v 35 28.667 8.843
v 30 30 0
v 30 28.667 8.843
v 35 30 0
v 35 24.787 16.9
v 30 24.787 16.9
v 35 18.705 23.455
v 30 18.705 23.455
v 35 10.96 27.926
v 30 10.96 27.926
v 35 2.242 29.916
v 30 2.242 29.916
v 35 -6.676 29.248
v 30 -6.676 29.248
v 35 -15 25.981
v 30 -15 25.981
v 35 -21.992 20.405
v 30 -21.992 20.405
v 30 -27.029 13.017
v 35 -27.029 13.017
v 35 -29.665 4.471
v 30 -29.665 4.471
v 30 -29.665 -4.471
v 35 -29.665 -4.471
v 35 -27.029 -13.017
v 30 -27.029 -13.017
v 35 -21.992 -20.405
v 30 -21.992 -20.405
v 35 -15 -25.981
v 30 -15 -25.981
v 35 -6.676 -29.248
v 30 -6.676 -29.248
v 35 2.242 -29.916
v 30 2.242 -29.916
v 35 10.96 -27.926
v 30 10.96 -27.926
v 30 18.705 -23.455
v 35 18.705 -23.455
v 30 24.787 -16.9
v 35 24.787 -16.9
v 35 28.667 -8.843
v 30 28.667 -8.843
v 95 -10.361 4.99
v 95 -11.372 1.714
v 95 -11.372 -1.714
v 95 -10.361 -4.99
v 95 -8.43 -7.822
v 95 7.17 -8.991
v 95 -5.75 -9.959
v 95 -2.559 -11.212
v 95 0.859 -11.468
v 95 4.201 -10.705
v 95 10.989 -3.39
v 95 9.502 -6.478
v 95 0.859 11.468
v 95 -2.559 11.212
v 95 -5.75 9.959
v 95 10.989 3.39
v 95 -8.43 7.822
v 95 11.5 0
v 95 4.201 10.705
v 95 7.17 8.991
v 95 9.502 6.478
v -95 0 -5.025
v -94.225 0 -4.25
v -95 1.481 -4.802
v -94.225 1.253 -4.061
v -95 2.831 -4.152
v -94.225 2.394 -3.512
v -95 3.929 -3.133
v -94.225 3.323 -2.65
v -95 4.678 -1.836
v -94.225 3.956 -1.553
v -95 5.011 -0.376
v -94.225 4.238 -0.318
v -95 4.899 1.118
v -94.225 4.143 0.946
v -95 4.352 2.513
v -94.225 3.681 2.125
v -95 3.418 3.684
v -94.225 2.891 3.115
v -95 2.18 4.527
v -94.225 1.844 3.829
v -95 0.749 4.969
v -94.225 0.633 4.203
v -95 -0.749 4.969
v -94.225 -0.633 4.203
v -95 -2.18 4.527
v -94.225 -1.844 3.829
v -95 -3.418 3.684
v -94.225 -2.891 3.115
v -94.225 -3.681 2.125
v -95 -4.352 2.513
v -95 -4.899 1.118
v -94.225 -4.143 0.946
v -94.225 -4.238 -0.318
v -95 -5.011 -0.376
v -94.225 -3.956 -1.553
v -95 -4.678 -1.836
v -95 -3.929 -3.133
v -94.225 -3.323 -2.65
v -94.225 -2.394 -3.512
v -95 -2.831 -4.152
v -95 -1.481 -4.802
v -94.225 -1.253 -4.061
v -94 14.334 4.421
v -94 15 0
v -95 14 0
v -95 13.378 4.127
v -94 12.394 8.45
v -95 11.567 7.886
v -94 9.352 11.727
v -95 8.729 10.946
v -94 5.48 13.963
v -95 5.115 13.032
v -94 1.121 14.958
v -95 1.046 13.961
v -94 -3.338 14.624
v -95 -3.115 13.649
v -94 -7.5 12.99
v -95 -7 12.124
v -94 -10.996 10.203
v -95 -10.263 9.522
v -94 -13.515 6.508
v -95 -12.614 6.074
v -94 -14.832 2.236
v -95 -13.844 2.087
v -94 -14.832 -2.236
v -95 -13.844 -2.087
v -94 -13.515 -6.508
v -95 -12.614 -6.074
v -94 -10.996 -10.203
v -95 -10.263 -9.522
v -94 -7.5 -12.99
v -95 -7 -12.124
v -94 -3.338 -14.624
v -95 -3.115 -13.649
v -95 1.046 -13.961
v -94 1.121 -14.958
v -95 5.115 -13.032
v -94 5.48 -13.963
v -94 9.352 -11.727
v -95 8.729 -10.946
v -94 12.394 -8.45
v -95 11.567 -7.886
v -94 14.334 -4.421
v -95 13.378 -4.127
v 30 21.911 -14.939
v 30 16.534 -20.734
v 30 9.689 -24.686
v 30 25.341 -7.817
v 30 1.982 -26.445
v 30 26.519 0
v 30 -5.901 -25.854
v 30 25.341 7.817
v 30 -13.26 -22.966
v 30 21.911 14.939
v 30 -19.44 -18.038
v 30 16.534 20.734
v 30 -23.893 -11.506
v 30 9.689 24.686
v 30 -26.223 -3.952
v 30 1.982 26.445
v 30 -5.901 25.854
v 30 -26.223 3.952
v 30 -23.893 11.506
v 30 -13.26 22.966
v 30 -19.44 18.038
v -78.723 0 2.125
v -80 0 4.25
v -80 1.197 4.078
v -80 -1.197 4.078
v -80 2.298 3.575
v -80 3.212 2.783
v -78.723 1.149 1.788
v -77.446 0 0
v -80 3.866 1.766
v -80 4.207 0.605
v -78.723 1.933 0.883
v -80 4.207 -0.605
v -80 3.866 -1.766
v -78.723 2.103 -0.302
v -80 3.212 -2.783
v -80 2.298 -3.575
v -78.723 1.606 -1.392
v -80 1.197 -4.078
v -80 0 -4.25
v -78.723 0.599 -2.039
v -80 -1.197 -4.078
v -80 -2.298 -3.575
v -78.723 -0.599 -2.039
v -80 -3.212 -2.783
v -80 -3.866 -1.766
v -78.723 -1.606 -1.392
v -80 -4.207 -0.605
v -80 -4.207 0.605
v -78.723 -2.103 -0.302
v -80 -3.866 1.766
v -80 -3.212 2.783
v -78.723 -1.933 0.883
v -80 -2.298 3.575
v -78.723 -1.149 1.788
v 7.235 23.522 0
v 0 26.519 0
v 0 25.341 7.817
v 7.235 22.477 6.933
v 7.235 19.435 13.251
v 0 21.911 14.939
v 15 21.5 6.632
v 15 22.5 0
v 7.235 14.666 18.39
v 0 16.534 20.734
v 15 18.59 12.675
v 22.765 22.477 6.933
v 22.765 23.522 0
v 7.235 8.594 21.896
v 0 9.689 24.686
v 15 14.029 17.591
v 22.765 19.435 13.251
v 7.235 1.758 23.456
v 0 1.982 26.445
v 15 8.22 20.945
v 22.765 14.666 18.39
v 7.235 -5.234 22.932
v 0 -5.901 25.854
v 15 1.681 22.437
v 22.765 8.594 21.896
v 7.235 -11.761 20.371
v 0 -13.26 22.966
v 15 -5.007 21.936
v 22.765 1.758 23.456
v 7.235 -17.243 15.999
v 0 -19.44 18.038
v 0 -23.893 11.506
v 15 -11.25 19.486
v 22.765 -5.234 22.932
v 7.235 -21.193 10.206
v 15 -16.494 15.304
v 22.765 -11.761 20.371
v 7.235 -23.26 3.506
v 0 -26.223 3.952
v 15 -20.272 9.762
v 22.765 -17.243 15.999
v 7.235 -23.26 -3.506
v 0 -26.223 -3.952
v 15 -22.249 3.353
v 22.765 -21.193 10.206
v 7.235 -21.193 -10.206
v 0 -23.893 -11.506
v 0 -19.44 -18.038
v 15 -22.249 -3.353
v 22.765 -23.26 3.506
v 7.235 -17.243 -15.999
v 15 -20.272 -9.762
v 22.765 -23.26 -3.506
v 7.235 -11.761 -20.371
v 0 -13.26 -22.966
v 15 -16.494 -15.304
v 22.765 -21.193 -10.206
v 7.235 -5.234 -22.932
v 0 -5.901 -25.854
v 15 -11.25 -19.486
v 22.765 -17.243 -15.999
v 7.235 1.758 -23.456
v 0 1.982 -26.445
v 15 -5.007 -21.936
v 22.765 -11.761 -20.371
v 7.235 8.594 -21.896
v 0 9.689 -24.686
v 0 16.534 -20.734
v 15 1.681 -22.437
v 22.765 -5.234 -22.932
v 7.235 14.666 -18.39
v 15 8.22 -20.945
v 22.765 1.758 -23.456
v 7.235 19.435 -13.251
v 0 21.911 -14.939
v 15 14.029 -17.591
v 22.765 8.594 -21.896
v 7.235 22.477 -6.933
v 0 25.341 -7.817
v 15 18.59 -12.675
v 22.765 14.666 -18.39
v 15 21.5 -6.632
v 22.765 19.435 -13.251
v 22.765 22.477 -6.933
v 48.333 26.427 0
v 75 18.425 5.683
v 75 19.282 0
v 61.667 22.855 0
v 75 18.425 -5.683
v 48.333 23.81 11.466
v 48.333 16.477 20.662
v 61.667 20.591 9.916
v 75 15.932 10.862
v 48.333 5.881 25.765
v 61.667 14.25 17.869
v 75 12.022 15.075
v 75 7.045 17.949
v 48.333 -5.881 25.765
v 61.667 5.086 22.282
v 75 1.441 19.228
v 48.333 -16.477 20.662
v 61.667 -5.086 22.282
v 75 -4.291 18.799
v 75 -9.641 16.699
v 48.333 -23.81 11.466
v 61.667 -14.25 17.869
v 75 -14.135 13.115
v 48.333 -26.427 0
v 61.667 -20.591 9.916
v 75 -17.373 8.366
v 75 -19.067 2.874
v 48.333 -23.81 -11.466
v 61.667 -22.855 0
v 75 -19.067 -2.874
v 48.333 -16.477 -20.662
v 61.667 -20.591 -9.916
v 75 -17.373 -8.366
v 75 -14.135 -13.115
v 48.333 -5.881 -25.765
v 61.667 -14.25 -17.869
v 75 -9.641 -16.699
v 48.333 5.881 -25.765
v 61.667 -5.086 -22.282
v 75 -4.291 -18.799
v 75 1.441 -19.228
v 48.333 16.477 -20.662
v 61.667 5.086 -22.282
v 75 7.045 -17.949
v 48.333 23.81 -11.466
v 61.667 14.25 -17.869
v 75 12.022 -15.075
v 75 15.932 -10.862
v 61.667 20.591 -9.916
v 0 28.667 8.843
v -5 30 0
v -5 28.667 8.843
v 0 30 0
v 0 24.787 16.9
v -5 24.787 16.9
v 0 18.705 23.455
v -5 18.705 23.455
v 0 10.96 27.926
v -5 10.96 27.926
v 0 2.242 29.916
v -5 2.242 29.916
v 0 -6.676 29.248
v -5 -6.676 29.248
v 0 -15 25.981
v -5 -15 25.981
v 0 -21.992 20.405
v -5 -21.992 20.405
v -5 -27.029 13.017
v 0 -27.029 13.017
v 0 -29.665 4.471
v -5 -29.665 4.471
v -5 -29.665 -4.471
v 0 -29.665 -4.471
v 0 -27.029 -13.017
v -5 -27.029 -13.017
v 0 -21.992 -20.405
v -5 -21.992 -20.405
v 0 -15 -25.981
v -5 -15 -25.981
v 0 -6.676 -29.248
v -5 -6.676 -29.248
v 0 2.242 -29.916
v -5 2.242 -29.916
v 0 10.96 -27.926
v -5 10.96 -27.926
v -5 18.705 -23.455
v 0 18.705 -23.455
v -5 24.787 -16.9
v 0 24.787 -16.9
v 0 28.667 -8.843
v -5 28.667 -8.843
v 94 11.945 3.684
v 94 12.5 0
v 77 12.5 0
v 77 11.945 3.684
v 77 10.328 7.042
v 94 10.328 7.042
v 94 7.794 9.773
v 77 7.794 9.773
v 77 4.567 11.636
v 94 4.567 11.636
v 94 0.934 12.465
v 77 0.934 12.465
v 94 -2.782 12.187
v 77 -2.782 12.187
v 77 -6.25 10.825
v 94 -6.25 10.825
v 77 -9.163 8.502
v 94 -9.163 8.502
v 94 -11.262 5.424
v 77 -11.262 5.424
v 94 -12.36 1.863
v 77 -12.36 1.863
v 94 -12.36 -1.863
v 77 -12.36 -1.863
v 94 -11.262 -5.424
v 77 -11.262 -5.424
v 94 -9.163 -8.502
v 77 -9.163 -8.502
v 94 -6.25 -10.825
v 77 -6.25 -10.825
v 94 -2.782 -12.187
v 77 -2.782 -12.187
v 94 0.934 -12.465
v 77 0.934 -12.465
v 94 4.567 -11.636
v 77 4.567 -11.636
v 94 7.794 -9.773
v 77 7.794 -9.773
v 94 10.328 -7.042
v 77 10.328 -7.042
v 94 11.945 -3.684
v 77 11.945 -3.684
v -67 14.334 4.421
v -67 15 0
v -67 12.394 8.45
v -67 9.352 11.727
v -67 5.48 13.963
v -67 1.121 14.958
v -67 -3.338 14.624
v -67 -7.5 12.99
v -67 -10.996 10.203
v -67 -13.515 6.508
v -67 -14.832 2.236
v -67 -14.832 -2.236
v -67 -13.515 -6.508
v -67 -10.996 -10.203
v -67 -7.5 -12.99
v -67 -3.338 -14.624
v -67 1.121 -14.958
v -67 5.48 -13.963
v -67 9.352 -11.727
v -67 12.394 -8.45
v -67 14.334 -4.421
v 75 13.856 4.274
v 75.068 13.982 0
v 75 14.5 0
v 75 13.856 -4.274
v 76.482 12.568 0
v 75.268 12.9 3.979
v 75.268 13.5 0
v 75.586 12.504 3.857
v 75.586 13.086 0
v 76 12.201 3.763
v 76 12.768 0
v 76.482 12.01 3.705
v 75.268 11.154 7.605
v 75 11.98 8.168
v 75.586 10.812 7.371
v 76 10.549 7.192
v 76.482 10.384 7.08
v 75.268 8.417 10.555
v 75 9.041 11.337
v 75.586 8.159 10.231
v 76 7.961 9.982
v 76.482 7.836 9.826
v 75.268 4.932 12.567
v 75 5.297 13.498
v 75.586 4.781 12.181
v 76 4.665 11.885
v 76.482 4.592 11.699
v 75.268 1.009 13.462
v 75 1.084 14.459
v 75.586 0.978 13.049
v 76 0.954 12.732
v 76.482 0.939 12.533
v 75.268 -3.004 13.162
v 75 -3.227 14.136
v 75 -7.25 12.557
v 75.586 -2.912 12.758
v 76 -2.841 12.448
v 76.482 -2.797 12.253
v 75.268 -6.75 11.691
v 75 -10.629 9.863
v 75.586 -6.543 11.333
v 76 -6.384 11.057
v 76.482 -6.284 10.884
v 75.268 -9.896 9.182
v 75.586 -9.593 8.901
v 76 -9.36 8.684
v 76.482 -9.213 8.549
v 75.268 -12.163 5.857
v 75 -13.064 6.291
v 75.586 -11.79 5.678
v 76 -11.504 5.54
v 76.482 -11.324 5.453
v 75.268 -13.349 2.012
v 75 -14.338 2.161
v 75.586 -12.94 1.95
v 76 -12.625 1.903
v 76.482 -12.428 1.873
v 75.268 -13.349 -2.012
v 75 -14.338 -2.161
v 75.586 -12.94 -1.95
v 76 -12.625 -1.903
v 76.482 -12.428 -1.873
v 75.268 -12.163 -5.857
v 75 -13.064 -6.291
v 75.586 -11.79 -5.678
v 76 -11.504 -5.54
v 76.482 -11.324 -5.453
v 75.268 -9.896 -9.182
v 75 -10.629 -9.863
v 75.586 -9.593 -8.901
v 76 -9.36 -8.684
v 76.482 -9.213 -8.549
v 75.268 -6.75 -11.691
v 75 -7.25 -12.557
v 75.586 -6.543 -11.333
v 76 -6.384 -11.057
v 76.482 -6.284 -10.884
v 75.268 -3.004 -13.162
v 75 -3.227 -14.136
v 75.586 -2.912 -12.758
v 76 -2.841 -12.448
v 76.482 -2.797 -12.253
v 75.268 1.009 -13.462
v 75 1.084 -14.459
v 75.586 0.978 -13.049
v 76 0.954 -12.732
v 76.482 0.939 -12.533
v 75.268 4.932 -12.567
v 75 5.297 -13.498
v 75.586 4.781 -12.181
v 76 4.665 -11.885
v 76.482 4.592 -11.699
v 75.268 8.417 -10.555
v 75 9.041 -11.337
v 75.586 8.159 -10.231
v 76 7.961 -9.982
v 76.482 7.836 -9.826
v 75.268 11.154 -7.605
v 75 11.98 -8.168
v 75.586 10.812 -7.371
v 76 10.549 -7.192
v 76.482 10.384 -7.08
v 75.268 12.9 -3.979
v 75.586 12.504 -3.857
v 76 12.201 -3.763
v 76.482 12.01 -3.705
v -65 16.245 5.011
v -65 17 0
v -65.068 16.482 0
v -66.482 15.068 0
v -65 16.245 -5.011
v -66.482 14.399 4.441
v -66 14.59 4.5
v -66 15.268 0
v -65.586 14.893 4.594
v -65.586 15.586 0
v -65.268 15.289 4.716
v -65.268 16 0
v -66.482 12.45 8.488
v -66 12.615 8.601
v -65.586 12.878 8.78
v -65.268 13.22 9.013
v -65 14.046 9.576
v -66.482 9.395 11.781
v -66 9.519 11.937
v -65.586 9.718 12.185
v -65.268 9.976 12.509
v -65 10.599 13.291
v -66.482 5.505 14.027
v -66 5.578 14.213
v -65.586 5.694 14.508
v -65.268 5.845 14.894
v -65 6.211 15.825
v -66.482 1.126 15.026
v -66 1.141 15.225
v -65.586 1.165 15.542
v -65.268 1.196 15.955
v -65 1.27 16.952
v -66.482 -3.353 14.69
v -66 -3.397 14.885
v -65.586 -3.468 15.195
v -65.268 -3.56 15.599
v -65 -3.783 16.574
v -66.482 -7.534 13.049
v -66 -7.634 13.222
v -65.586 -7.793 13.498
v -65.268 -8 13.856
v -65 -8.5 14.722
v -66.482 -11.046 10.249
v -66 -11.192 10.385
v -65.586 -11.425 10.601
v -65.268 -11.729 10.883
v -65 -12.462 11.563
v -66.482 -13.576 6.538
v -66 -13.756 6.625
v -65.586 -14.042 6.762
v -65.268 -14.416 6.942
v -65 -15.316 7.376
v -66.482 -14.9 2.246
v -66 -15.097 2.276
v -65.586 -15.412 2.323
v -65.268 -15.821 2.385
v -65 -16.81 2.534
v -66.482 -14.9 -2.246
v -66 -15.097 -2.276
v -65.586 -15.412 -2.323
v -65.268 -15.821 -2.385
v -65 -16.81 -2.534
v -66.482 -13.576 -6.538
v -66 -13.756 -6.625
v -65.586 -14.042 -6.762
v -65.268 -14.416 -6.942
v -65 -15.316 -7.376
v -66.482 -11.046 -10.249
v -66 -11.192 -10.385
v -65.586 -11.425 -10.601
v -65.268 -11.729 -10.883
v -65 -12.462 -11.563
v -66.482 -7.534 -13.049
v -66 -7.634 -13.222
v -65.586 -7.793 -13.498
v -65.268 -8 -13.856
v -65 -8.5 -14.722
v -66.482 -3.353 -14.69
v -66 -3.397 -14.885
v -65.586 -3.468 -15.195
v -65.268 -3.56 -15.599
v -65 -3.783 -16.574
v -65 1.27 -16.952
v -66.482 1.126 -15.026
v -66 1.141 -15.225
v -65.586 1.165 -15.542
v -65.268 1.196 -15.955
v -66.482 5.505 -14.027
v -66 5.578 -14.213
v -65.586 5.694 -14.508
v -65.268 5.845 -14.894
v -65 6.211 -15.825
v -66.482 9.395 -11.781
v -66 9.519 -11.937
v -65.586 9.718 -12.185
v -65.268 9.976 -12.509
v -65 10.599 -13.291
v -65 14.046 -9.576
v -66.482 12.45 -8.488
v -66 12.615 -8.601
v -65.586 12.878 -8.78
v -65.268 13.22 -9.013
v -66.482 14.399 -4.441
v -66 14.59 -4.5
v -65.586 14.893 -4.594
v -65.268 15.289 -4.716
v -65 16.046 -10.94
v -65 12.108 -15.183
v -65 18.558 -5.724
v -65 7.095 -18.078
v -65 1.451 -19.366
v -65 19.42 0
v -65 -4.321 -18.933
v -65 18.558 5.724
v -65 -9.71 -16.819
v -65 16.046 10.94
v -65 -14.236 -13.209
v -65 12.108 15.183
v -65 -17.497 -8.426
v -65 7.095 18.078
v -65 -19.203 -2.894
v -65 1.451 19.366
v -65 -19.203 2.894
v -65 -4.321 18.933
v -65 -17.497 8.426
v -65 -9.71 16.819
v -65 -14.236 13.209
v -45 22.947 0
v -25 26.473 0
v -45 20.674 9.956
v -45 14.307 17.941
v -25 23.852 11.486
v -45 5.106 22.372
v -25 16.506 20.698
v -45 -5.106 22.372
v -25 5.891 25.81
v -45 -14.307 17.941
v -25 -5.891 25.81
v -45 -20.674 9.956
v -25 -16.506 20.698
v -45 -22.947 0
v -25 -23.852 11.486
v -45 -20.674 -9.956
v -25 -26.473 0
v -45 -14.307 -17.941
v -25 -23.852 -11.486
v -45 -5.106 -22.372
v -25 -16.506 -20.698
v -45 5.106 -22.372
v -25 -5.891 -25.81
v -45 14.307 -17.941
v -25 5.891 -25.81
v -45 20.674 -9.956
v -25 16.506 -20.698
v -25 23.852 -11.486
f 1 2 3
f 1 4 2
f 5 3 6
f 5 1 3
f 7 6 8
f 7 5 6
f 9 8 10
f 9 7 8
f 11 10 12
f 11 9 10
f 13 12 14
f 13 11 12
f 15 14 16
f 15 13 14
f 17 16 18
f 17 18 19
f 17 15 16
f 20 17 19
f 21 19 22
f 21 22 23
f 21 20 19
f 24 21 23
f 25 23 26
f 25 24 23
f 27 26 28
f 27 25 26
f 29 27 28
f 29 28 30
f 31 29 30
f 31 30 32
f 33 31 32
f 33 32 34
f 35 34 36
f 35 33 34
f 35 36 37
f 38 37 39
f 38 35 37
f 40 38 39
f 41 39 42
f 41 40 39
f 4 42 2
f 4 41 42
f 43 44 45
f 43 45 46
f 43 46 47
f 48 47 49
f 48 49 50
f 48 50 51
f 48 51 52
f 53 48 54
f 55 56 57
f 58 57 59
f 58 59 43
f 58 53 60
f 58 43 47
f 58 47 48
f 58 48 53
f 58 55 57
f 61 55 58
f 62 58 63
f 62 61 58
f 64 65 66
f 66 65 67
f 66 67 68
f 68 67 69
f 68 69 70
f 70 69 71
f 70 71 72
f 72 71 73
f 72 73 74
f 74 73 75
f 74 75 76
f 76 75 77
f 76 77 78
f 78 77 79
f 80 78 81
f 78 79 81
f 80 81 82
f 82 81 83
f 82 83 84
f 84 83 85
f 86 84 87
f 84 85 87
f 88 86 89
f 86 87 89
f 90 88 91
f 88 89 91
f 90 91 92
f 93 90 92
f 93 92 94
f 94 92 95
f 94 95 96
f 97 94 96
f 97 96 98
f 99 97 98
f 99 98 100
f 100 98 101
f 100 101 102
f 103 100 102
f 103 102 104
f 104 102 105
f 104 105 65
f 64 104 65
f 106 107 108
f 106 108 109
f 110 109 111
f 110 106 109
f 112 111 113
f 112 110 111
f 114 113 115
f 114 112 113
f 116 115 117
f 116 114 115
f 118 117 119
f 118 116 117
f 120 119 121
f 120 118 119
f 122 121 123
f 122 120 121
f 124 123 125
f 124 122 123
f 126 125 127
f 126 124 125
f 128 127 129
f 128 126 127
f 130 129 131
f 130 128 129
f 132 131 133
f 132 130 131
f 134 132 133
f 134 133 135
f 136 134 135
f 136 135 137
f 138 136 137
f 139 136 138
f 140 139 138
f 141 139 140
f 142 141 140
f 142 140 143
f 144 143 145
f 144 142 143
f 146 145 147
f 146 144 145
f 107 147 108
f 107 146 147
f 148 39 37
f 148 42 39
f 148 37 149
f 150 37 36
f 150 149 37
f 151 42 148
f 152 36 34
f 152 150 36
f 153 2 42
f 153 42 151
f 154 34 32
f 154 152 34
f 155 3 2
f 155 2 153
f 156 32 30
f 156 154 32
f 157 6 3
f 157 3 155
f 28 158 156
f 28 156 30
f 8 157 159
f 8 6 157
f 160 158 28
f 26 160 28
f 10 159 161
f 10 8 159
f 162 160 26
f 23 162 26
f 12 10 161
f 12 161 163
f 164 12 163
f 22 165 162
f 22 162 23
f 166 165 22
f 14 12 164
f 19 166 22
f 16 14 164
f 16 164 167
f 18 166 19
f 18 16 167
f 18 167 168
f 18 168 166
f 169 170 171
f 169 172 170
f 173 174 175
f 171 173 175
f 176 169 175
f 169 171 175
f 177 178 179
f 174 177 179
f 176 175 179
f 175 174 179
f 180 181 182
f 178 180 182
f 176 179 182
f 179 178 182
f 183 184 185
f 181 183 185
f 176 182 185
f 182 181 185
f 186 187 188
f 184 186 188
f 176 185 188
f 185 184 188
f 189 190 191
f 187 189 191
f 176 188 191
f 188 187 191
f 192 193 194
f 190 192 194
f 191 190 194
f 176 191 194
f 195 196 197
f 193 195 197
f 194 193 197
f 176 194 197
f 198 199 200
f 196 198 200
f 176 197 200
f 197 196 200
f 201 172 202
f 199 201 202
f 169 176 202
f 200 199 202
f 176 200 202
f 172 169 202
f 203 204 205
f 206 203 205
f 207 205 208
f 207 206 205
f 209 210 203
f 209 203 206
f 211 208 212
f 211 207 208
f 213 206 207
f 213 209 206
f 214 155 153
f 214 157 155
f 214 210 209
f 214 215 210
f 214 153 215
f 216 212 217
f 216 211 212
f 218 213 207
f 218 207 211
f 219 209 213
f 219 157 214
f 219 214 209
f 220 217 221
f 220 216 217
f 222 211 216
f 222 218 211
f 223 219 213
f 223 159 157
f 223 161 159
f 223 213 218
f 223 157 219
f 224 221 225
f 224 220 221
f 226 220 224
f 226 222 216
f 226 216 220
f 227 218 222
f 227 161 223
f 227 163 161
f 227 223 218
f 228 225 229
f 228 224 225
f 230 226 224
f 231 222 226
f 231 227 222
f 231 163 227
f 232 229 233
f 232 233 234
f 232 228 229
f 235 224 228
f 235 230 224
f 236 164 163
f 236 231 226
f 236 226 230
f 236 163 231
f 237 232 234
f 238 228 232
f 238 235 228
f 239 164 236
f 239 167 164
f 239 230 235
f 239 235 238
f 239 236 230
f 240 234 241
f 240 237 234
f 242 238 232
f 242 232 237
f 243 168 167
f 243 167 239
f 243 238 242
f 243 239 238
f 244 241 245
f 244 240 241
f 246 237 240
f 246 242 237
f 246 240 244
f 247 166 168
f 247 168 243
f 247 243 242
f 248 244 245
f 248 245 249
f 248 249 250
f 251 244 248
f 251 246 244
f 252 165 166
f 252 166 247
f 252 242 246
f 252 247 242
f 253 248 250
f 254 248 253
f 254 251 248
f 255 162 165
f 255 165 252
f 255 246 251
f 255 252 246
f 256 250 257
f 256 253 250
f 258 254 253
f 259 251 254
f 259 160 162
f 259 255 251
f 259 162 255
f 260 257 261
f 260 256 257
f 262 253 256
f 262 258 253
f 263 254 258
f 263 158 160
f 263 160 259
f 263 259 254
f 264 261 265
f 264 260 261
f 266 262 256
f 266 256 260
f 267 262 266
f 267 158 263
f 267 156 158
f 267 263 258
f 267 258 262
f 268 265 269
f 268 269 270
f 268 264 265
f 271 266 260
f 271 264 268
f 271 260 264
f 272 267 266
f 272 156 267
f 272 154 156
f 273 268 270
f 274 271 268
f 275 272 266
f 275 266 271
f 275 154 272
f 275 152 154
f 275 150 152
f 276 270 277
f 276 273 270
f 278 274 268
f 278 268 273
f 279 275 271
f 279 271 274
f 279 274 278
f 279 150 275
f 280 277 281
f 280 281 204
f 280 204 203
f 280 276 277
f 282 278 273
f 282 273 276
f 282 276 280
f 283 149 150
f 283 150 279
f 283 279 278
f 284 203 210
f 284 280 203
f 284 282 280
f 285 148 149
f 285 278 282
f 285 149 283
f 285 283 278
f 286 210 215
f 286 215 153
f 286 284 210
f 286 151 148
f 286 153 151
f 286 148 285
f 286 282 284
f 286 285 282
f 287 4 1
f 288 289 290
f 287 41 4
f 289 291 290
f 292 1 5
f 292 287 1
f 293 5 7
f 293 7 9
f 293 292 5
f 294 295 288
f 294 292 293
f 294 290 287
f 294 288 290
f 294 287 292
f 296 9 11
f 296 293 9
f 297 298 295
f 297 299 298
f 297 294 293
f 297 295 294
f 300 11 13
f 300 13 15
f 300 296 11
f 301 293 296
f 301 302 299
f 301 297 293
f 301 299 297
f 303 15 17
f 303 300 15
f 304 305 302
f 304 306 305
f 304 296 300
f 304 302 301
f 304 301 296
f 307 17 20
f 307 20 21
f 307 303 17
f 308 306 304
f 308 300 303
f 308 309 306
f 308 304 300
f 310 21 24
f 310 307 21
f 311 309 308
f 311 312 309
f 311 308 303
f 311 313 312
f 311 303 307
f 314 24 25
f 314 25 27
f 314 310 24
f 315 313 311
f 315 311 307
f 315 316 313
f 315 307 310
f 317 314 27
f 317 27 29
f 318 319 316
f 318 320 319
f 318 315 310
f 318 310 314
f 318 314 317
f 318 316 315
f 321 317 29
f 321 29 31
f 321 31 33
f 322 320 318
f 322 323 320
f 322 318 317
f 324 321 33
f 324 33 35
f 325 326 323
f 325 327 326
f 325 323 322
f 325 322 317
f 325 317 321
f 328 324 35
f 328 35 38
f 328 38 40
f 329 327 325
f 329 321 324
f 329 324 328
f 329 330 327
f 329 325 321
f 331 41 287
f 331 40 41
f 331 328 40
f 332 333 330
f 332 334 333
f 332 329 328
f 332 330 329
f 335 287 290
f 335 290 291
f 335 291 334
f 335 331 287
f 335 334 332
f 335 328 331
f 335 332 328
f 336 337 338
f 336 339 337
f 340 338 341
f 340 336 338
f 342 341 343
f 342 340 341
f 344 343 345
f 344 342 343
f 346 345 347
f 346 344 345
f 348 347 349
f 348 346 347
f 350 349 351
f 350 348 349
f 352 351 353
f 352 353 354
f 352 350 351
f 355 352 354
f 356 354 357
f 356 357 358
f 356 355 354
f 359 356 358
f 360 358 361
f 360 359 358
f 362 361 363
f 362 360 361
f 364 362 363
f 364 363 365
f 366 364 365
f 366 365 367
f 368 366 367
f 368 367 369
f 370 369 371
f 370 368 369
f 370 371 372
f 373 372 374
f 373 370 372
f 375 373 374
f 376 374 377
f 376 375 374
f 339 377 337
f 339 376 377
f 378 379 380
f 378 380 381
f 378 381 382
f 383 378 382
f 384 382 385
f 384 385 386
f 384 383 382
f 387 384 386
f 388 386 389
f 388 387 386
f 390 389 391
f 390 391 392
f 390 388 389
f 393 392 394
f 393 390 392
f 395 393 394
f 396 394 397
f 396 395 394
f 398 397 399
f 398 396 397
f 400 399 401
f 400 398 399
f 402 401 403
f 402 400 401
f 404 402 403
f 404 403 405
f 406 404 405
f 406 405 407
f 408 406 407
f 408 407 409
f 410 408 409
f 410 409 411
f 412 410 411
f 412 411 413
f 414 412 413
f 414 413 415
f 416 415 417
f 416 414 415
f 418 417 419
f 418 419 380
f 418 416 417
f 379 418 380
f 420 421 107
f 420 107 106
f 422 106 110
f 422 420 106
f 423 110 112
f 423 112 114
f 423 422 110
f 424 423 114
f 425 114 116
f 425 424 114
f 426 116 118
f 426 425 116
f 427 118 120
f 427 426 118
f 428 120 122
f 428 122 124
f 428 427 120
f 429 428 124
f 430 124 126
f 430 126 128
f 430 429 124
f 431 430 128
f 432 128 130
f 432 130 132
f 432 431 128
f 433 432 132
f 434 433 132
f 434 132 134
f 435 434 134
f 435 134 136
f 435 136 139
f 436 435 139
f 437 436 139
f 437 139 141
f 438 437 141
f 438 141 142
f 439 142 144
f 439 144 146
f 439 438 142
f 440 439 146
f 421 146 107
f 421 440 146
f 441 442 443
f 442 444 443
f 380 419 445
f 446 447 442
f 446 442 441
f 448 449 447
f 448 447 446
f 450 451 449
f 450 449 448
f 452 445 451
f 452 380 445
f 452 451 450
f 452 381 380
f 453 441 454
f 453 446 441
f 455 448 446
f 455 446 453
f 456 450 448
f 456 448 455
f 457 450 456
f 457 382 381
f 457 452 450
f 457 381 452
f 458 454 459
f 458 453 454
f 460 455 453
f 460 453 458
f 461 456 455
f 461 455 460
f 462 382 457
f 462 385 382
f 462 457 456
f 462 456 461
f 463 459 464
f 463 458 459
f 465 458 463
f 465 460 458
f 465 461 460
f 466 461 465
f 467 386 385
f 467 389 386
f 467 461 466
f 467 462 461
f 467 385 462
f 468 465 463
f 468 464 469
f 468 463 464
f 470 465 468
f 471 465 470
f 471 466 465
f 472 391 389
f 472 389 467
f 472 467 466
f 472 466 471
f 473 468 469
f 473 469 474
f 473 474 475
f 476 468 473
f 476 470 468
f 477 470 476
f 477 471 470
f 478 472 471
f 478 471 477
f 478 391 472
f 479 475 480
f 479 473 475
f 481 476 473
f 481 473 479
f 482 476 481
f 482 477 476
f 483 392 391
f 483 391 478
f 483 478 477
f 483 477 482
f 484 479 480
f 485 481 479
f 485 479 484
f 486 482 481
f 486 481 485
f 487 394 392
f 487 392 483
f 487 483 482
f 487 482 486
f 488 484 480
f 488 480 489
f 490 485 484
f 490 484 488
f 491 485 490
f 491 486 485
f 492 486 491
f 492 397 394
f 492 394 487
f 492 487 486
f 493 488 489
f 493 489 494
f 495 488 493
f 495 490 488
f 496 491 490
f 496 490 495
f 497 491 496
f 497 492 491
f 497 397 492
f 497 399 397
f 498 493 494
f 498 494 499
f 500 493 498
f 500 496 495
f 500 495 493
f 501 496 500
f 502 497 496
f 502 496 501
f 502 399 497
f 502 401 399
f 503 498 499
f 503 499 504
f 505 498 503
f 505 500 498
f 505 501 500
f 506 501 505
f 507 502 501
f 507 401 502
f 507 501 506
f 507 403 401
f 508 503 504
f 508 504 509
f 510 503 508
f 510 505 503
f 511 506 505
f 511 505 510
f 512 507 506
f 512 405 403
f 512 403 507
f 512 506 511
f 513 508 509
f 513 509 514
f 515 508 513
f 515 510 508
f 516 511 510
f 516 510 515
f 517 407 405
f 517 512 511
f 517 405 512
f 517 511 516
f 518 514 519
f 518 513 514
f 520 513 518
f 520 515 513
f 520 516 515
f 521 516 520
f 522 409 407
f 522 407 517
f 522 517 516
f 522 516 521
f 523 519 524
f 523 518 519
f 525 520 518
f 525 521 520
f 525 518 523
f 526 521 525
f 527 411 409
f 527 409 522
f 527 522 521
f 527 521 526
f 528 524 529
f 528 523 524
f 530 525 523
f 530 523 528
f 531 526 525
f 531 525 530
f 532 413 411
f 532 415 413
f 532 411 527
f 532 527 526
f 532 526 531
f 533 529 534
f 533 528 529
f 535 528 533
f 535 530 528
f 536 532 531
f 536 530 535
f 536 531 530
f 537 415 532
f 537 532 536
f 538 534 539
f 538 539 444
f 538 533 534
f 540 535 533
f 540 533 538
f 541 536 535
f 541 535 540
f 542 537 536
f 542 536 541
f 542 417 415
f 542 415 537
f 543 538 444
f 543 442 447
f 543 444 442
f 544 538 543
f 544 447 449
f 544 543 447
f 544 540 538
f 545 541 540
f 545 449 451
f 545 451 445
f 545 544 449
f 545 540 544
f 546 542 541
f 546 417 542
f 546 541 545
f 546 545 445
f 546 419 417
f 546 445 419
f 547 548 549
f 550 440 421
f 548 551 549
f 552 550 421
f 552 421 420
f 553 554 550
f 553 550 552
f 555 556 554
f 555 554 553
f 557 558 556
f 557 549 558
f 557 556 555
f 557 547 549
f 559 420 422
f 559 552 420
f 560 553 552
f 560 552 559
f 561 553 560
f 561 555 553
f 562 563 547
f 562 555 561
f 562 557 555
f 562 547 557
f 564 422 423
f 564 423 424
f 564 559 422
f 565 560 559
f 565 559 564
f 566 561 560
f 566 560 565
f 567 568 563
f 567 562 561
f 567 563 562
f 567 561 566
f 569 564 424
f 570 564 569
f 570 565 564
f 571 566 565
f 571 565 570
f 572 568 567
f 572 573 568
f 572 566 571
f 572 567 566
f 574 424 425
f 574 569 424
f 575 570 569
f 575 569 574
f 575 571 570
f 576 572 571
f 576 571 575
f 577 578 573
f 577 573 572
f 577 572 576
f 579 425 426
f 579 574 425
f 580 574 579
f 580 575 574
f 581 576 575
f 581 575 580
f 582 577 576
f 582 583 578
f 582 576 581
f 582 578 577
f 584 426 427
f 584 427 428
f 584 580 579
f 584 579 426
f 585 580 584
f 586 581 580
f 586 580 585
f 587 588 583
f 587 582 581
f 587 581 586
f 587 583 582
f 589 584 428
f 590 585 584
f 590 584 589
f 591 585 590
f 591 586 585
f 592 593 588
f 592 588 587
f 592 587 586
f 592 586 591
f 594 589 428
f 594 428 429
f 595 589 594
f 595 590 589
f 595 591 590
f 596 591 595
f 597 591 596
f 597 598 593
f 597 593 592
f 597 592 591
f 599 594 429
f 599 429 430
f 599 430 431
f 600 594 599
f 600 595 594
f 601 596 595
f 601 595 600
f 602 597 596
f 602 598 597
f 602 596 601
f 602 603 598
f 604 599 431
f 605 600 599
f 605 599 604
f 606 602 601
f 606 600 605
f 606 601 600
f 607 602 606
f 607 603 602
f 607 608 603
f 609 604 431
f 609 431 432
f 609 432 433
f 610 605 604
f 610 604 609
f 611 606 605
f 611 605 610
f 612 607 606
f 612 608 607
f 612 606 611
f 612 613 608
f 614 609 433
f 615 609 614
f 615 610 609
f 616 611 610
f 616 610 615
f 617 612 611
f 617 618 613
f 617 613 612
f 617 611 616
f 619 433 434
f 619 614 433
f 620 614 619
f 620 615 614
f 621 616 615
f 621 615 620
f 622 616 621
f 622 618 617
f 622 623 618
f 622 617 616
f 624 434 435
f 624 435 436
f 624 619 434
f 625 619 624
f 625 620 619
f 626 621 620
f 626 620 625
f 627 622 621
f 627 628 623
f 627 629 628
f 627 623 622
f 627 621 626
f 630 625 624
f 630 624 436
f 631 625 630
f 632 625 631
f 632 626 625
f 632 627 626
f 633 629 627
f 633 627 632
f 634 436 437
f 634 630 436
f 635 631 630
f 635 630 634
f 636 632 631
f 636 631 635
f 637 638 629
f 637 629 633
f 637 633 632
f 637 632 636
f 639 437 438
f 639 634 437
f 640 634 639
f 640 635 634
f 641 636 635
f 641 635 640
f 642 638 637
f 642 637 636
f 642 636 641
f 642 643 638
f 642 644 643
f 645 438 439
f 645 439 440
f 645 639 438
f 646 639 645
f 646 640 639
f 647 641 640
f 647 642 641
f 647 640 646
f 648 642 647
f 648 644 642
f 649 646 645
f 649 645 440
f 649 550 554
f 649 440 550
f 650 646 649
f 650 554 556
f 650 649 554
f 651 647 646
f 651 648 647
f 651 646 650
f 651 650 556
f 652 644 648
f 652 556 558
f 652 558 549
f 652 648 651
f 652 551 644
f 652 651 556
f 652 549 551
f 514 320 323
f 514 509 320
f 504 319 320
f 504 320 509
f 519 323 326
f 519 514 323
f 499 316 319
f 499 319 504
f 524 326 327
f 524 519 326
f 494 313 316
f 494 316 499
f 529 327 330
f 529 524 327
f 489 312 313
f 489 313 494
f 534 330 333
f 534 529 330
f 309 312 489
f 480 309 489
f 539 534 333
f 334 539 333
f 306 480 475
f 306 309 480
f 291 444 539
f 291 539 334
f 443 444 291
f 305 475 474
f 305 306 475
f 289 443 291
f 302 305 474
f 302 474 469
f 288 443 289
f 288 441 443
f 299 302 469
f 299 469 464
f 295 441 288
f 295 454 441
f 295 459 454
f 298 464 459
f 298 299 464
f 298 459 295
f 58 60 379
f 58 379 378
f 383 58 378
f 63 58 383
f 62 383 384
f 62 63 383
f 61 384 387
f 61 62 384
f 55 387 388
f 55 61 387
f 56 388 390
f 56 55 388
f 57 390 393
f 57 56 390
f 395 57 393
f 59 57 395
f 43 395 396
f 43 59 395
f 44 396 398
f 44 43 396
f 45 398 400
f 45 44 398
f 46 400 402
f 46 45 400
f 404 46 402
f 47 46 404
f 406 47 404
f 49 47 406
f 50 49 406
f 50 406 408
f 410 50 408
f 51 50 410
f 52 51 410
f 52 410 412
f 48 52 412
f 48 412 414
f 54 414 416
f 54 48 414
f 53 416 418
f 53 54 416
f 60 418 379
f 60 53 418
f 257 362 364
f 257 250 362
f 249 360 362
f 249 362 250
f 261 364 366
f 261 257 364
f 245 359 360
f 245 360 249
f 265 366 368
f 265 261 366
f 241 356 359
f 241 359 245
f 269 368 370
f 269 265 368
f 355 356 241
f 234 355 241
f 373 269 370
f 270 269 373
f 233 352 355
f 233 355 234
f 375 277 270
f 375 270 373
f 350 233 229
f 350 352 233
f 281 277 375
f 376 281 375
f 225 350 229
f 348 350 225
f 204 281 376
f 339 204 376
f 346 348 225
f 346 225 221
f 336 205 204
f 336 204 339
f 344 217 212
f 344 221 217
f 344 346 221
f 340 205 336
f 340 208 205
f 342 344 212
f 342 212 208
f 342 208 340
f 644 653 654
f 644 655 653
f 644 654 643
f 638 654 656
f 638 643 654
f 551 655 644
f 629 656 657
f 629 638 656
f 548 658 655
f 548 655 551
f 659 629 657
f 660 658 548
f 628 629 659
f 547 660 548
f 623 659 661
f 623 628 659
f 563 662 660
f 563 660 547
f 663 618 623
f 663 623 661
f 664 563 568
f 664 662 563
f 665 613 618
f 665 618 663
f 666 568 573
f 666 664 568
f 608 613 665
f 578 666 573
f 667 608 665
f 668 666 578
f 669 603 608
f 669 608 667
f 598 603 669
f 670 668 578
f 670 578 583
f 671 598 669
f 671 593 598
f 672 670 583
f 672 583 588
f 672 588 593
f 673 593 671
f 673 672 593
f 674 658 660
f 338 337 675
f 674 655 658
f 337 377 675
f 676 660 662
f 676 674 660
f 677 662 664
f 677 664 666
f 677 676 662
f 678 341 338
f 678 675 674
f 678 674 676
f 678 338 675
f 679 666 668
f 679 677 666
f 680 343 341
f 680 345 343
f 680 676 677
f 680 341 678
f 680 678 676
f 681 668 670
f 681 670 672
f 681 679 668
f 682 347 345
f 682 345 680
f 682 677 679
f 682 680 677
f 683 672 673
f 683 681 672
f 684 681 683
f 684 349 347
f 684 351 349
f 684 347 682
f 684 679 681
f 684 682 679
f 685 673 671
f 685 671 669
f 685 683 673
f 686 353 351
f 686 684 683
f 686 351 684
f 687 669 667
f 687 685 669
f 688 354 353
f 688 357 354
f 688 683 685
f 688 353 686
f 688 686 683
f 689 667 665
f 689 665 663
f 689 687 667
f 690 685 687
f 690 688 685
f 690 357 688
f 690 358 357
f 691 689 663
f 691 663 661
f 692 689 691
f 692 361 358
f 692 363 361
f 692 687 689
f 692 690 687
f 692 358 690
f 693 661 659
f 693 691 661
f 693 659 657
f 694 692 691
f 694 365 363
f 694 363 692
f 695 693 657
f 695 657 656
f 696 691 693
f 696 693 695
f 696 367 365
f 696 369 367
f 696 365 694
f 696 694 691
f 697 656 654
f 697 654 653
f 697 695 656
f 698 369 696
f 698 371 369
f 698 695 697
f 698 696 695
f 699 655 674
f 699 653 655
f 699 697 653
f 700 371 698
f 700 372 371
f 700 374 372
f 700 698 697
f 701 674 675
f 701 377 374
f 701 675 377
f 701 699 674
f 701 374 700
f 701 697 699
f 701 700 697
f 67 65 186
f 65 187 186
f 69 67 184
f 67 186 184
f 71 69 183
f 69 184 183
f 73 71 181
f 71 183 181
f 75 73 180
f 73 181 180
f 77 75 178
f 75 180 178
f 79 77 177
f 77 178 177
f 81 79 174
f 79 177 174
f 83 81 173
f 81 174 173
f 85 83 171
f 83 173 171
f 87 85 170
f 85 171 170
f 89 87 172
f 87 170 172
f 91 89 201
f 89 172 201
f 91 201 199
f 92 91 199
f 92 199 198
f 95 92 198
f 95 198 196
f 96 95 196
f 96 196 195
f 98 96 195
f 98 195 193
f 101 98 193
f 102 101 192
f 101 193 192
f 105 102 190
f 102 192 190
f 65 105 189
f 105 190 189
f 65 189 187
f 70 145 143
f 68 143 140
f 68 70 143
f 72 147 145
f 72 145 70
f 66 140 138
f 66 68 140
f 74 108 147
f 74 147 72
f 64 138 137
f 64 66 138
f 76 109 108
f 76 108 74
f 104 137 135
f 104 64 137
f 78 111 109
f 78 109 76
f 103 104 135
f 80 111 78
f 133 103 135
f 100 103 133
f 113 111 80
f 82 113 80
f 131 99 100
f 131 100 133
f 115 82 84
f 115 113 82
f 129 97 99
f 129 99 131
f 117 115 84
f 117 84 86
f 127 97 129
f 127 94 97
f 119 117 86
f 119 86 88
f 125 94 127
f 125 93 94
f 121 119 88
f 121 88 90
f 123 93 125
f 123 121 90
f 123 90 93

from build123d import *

# Parameters (mm, degrees)
CHANFRO1_SIZE                    = 1
FILETE1_R                        = 2
FURO_ROSCADO_DE_M101_D           = 8.5
FURO_ROSCADO_DE_M101_DEPTH       = 15
FURO_ROSCADO_DE_M101_CSINK_D     = 10.05
FURO_ROSCADO_DE_M101_CSINK_ANGLE = 90
FURO_ROSCADO_DE_M101_TIP         = 2.553657631


with BuildPart() as part:
    # Esboço1 → Revolução1 (revolve)
    with BuildSketch(Plane.XY):
        with BuildLine():
            Line((-95, 0), (-95, 15))
            Line((-95, 15), (-65, 15))
            Line((-65, 15), (-65, 19.420381157))
            Line((-65, 19.420381157), (-5, 30))
            Line((-5, 30), (0, 30))
            Line((0, 30), (0, 26.519237886))
            ThreePointArc((0, 26.519237886), (15, 22.5), (30, 26.519237886))
            Line((30, 26.519237886), (30, 30))
            Line((30, 30), (35, 30))
            Line((35, 30), (75, 19.282032303))
            Line((75, 19.282032303), (75, 12.5))
            Line((75, 12.5), (95, 12.5))
            Line((95, 12.5), (95, 0))
            Line((95, 0), (-95, 0))
        make_face()
    revolve(axis=Axis((-95, 0, 0), (1, 0, 0)))

    # Chanfro1
    chanfro1_edges = [part.edges().sort_by_distance(p)[0] for p in [
        (-95, -15, 0),
        (95, -12.5, 0),
    ]]
    chamfer(chanfro1_edges, length=CHANFRO1_SIZE)

    # Filete1
    filete1_edges = [part.edges().sort_by_distance(p)[0] for p in [
        (-65, -15, 0),
        (75, -12.5, 0),
    ]]
    fillet(filete1_edges, radius=FILETE1_R)

    # Furo roscado de M101
    with Locations(Plane.ZY.offset(95)):
        with Locations((0, 0)):
            CounterSinkHole(FURO_ROSCADO_DE_M101_D / 2, FURO_ROSCADO_DE_M101_CSINK_D / 2, depth=FURO_ROSCADO_DE_M101_DEPTH, counter_sink_angle=FURO_ROSCADO_DE_M101_CSINK_ANGLE)
            with Locations((0, 0, -(FURO_ROSCADO_DE_M101_DEPTH + FURO_ROSCADO_DE_M101_TIP / 2))):  # 118° drill point
                Cone(0, FURO_ROSCADO_DE_M101_D / 2, FURO_ROSCADO_DE_M101_TIP, mode=Mode.SUBTRACT)


solid = part.part
